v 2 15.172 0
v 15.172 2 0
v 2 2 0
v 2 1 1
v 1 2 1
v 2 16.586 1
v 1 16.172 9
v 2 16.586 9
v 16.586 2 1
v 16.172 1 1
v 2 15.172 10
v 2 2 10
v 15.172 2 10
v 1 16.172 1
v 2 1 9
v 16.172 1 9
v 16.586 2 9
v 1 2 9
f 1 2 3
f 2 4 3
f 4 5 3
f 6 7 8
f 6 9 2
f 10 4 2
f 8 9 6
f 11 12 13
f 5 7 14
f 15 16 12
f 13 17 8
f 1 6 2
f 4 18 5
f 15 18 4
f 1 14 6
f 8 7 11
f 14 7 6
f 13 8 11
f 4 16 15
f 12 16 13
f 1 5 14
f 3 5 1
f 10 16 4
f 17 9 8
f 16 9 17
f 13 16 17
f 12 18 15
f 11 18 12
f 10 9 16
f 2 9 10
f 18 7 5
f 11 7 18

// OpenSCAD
// file: ../functions/vectors2D.scad
/* * * * * * * * * * * * * * * * * * * * * * * * * * * * * * * * * * * * *\
 * Copyright (C) Claus Schrammel <claus@f05fk.net>                       *
 *                                                                       *
 * This program is free software: you can redistribute it and/or modify  *
 * it under the terms of the GNU General Public License as published by  *
 * the Free Software Foundation, either version 3 of the License, or     *
 * (at your option) any later version.                                   *
 *                                                                       *
 * This program is distributed in the hope that it will be useful,       *
 * but WITHOUT ANY WARRANTY; without even the implied warranty of        *
 * MERCHANTABILITY or FITNESS FOR A PARTICULAR PURPOSE.  See the         *
 * GNU General Public License for more details.                          *
 *                                                                       *
 * You should have received a copy of the GNU General Public License     *
 * along with this program.  If not, see <http://www.gnu.org/licenses/>. *
 *                                                                       *
 * SPDX-License-Identifier: GPL-3.0-or-later                             *
\* * * * * * * * * * * * * * * * * * * * * * * * * * * * * * * * * * * * */

include <utils.scad>

function normal_vector_2D(vector) = [-vector.y, vector.x];
function unit_vector_2D(vector) = vector / norm(vector);

/*
 * Calculates the coefficient for v1 to get from p1 to the intersection point of the two lines p1/v1 and p2/v2:
 * intersection_point = p1 + v1 * intersection_coefficient1.
 */
function intersection_coefficient1(p1, v1, p2, v2) = ( v2.x * (p1.y - p2.y) - v2.y * (p1.x - p2.x) ) / (v1.x * v2.y - v1.y * v2.x);

/*
 * Calculates the coefficient for v2 to get from p2 to the intersection point of the two lines p1/v1 and p2/v2:
 * intersection_point = p2 + v2 * intersection_coefficient2.
 */
function intersection_coefficient2(p1, v1, p2, v2) = intersection_coefficient1(p2, v2, p1, v1);

/*
 * Calculates the intersection point of the two lines p1/v1 and p2/v2.
 */
function intersection_point(p1, v1, p2, v2) = p1 + v1 * intersection_coefficient1(p1, v1, p2, v2);
// file: ../functions/utils.scad
/* * * * * * * * * * * * * * * * * * * * * * * * * * * * * * * * * * * * *\
 * Copyright (C) Claus Schrammel <claus@f05fk.net>                       *
 *                                                                       *
 * This program is free software: you can redistribute it and/or modify  *
 * it under the terms of the GNU General Public License as published by  *
 * the Free Software Foundation, either version 3 of the License, or     *
 * (at your option) any later version.                                   *
 *                                                                       *
 * This program is distributed in the hope that it will be useful,       *
 * but WITHOUT ANY WARRANTY; without even the implied warranty of        *
 * MERCHANTABILITY or FITNESS FOR A PARTICULAR PURPOSE.  See the         *
 * GNU General Public License for more details.                          *
 *                                                                       *
 * You should have received a copy of the GNU General Public License     *
 * along with this program.  If not, see <http://www.gnu.org/licenses/>. *
 *                                                                       *
 * SPDX-License-Identifier: GPL-3.0-or-later                             *
\* * * * * * * * * * * * * * * * * * * * * * * * * * * * * * * * * * * * */

// the modulo operator % creates negative results for negative inputs n
function modulo(n, m) = ((n % m) + m) % m;

function cyclic_array(array, index) = array[modulo(index, len(array))];
// file: ../functions/polygons.scad
/* * * * * * * * * * * * * * * * * * * * * * * * * * * * * * * * * * * * *\
 * Copyright (C) Claus Schrammel <claus@f05fk.net>                       *
 *                                                                       *
 * This program is free software: you can redistribute it and/or modify  *
 * it under the terms of the GNU General Public License as published by  *
 * the Free Software Foundation, either version 3 of the License, or     *
 * (at your option) any later version.                                   *
 *                                                                       *
 * This program is distributed in the hope that it will be useful,       *
 * but WITHOUT ANY WARRANTY; without even the implied warranty of        *
 * MERCHANTABILITY or FITNESS FOR A PARTICULAR PURPOSE.  See the         *
 * GNU General Public License for more details.                          *
 *                                                                       *
 * You should have received a copy of the GNU General Public License     *
 * along with this program.  If not, see <http://www.gnu.org/licenses/>. *
 *                                                                       *
 * SPDX-License-Identifier: GPL-3.0-or-later                             *
\* * * * * * * * * * * * * * * * * * * * * * * * * * * * * * * * * * * * */

include <utils.scad>
include <vectors2D.scad>

/*
 * Shrinks the polygon by moving the edges "inwards" by the given distance.
 * The points need to be given in the counter-clockwise order, i.e. applying the
 * right-hand rule with the thumb pointing in the z direction.
 */
function shrink_edges(points, distance) =
    [ for (i = [0 : 1 : len(points) - 1])
        let (p1 = cyclic_array(points, i - 1), p2 = cyclic_array(points, i), p3 = cyclic_array(points, i + 1),
                v1 = p2 - p1, v2 = p3 - p2,
                n1 = unit_vector_2D(normal_vector_2D(v1)), n2 = unit_vector_2D(normal_vector_2D(v2)))
            intersection_point(p1 + n1 * distance, v1, p2 + n2 * distance, v2)
    ];

/*
 * Grows the polygon by moving the edges "outwards" by the given distance.
 * The points need to be given in the counter-clockwise order, i.e. applying the
 * right-hand rule with the thumb pointing in the z direction.
 */
function grow_edges(points, distance) = shrink_edges(points, -distance);

/*
 * Flattens the corners of the polygon by cutting off at the intersection points where one of the edges
 * is moved "inwards" by the given distance, while the other edge is not, and vice-versa.
 * The points need to be given in the counter-clockwise order, i.e. applying the
 * right-hand rule with the thumb pointing in the z direction.
 */
function flatten_corners(points, distance) = 
    [ for (i = [0 : 1 : len(points) - 1])
        let (p1 = cyclic_array(points, i - 1), p2 = cyclic_array(points, i), p3 = cyclic_array(points, i + 1),
                v1 = p2 - p1, v2 = p3 - p2,
                n1 = unit_vector_2D(normal_vector_2D(v1)), n2 = unit_vector_2D(normal_vector_2D(v2)))
            each [
                intersection_point(p1, v1, p2 + n2 * distance, v2),
                intersection_point(p1 + n1 * distance, v1, p2, v2)
            ]
    ];
// main file
/* * * * * * * * * * * * * * * * * * * * * * * * * * * * * * * * * * * * *\
 * Copyright (C) Claus Schrammel <claus@f05fk.net>                       *
 *                                                                       *
 * This program is free software: you can redistribute it and/or modify  *
 * it under the terms of the GNU General Public License as published by  *
 * the Free Software Foundation, either version 3 of the License, or     *
 * (at your option) any later version.                                   *
 *                                                                       *
 * This program is distributed in the hope that it will be useful,       *
 * but WITHOUT ANY WARRANTY; without even the implied warranty of        *
 * MERCHANTABILITY or FITNESS FOR A PARTICULAR PURPOSE.  See the         *
 * GNU General Public License for more details.                          *
 *                                                                       *
 * You should have received a copy of the GNU General Public License     *
 * along with this program.  If not, see <http://www.gnu.org/licenses/>. *
 *                                                                       *
 * SPDX-License-Identifier: GPL-3.0-or-later                             *
\* * * * * * * * * * * * * * * * * * * * * * * * * * * * * * * * * * * * */

include <../functions/polygons.scad>

points = [[0, 0], [20, 0], [0, 20]];

PrismaConvexChamfered(shrink_edges(points, 1), 10, 1);

module PrismaConvexChamfered(points, height, delta) {
    hull() {
        linear_extrude(height) polygon(shrink_edges(points, delta));
        translate([0, 0, delta]) linear_extrude(height - 2 * delta) polygon(flatten_corners(points, delta));
    }
}
